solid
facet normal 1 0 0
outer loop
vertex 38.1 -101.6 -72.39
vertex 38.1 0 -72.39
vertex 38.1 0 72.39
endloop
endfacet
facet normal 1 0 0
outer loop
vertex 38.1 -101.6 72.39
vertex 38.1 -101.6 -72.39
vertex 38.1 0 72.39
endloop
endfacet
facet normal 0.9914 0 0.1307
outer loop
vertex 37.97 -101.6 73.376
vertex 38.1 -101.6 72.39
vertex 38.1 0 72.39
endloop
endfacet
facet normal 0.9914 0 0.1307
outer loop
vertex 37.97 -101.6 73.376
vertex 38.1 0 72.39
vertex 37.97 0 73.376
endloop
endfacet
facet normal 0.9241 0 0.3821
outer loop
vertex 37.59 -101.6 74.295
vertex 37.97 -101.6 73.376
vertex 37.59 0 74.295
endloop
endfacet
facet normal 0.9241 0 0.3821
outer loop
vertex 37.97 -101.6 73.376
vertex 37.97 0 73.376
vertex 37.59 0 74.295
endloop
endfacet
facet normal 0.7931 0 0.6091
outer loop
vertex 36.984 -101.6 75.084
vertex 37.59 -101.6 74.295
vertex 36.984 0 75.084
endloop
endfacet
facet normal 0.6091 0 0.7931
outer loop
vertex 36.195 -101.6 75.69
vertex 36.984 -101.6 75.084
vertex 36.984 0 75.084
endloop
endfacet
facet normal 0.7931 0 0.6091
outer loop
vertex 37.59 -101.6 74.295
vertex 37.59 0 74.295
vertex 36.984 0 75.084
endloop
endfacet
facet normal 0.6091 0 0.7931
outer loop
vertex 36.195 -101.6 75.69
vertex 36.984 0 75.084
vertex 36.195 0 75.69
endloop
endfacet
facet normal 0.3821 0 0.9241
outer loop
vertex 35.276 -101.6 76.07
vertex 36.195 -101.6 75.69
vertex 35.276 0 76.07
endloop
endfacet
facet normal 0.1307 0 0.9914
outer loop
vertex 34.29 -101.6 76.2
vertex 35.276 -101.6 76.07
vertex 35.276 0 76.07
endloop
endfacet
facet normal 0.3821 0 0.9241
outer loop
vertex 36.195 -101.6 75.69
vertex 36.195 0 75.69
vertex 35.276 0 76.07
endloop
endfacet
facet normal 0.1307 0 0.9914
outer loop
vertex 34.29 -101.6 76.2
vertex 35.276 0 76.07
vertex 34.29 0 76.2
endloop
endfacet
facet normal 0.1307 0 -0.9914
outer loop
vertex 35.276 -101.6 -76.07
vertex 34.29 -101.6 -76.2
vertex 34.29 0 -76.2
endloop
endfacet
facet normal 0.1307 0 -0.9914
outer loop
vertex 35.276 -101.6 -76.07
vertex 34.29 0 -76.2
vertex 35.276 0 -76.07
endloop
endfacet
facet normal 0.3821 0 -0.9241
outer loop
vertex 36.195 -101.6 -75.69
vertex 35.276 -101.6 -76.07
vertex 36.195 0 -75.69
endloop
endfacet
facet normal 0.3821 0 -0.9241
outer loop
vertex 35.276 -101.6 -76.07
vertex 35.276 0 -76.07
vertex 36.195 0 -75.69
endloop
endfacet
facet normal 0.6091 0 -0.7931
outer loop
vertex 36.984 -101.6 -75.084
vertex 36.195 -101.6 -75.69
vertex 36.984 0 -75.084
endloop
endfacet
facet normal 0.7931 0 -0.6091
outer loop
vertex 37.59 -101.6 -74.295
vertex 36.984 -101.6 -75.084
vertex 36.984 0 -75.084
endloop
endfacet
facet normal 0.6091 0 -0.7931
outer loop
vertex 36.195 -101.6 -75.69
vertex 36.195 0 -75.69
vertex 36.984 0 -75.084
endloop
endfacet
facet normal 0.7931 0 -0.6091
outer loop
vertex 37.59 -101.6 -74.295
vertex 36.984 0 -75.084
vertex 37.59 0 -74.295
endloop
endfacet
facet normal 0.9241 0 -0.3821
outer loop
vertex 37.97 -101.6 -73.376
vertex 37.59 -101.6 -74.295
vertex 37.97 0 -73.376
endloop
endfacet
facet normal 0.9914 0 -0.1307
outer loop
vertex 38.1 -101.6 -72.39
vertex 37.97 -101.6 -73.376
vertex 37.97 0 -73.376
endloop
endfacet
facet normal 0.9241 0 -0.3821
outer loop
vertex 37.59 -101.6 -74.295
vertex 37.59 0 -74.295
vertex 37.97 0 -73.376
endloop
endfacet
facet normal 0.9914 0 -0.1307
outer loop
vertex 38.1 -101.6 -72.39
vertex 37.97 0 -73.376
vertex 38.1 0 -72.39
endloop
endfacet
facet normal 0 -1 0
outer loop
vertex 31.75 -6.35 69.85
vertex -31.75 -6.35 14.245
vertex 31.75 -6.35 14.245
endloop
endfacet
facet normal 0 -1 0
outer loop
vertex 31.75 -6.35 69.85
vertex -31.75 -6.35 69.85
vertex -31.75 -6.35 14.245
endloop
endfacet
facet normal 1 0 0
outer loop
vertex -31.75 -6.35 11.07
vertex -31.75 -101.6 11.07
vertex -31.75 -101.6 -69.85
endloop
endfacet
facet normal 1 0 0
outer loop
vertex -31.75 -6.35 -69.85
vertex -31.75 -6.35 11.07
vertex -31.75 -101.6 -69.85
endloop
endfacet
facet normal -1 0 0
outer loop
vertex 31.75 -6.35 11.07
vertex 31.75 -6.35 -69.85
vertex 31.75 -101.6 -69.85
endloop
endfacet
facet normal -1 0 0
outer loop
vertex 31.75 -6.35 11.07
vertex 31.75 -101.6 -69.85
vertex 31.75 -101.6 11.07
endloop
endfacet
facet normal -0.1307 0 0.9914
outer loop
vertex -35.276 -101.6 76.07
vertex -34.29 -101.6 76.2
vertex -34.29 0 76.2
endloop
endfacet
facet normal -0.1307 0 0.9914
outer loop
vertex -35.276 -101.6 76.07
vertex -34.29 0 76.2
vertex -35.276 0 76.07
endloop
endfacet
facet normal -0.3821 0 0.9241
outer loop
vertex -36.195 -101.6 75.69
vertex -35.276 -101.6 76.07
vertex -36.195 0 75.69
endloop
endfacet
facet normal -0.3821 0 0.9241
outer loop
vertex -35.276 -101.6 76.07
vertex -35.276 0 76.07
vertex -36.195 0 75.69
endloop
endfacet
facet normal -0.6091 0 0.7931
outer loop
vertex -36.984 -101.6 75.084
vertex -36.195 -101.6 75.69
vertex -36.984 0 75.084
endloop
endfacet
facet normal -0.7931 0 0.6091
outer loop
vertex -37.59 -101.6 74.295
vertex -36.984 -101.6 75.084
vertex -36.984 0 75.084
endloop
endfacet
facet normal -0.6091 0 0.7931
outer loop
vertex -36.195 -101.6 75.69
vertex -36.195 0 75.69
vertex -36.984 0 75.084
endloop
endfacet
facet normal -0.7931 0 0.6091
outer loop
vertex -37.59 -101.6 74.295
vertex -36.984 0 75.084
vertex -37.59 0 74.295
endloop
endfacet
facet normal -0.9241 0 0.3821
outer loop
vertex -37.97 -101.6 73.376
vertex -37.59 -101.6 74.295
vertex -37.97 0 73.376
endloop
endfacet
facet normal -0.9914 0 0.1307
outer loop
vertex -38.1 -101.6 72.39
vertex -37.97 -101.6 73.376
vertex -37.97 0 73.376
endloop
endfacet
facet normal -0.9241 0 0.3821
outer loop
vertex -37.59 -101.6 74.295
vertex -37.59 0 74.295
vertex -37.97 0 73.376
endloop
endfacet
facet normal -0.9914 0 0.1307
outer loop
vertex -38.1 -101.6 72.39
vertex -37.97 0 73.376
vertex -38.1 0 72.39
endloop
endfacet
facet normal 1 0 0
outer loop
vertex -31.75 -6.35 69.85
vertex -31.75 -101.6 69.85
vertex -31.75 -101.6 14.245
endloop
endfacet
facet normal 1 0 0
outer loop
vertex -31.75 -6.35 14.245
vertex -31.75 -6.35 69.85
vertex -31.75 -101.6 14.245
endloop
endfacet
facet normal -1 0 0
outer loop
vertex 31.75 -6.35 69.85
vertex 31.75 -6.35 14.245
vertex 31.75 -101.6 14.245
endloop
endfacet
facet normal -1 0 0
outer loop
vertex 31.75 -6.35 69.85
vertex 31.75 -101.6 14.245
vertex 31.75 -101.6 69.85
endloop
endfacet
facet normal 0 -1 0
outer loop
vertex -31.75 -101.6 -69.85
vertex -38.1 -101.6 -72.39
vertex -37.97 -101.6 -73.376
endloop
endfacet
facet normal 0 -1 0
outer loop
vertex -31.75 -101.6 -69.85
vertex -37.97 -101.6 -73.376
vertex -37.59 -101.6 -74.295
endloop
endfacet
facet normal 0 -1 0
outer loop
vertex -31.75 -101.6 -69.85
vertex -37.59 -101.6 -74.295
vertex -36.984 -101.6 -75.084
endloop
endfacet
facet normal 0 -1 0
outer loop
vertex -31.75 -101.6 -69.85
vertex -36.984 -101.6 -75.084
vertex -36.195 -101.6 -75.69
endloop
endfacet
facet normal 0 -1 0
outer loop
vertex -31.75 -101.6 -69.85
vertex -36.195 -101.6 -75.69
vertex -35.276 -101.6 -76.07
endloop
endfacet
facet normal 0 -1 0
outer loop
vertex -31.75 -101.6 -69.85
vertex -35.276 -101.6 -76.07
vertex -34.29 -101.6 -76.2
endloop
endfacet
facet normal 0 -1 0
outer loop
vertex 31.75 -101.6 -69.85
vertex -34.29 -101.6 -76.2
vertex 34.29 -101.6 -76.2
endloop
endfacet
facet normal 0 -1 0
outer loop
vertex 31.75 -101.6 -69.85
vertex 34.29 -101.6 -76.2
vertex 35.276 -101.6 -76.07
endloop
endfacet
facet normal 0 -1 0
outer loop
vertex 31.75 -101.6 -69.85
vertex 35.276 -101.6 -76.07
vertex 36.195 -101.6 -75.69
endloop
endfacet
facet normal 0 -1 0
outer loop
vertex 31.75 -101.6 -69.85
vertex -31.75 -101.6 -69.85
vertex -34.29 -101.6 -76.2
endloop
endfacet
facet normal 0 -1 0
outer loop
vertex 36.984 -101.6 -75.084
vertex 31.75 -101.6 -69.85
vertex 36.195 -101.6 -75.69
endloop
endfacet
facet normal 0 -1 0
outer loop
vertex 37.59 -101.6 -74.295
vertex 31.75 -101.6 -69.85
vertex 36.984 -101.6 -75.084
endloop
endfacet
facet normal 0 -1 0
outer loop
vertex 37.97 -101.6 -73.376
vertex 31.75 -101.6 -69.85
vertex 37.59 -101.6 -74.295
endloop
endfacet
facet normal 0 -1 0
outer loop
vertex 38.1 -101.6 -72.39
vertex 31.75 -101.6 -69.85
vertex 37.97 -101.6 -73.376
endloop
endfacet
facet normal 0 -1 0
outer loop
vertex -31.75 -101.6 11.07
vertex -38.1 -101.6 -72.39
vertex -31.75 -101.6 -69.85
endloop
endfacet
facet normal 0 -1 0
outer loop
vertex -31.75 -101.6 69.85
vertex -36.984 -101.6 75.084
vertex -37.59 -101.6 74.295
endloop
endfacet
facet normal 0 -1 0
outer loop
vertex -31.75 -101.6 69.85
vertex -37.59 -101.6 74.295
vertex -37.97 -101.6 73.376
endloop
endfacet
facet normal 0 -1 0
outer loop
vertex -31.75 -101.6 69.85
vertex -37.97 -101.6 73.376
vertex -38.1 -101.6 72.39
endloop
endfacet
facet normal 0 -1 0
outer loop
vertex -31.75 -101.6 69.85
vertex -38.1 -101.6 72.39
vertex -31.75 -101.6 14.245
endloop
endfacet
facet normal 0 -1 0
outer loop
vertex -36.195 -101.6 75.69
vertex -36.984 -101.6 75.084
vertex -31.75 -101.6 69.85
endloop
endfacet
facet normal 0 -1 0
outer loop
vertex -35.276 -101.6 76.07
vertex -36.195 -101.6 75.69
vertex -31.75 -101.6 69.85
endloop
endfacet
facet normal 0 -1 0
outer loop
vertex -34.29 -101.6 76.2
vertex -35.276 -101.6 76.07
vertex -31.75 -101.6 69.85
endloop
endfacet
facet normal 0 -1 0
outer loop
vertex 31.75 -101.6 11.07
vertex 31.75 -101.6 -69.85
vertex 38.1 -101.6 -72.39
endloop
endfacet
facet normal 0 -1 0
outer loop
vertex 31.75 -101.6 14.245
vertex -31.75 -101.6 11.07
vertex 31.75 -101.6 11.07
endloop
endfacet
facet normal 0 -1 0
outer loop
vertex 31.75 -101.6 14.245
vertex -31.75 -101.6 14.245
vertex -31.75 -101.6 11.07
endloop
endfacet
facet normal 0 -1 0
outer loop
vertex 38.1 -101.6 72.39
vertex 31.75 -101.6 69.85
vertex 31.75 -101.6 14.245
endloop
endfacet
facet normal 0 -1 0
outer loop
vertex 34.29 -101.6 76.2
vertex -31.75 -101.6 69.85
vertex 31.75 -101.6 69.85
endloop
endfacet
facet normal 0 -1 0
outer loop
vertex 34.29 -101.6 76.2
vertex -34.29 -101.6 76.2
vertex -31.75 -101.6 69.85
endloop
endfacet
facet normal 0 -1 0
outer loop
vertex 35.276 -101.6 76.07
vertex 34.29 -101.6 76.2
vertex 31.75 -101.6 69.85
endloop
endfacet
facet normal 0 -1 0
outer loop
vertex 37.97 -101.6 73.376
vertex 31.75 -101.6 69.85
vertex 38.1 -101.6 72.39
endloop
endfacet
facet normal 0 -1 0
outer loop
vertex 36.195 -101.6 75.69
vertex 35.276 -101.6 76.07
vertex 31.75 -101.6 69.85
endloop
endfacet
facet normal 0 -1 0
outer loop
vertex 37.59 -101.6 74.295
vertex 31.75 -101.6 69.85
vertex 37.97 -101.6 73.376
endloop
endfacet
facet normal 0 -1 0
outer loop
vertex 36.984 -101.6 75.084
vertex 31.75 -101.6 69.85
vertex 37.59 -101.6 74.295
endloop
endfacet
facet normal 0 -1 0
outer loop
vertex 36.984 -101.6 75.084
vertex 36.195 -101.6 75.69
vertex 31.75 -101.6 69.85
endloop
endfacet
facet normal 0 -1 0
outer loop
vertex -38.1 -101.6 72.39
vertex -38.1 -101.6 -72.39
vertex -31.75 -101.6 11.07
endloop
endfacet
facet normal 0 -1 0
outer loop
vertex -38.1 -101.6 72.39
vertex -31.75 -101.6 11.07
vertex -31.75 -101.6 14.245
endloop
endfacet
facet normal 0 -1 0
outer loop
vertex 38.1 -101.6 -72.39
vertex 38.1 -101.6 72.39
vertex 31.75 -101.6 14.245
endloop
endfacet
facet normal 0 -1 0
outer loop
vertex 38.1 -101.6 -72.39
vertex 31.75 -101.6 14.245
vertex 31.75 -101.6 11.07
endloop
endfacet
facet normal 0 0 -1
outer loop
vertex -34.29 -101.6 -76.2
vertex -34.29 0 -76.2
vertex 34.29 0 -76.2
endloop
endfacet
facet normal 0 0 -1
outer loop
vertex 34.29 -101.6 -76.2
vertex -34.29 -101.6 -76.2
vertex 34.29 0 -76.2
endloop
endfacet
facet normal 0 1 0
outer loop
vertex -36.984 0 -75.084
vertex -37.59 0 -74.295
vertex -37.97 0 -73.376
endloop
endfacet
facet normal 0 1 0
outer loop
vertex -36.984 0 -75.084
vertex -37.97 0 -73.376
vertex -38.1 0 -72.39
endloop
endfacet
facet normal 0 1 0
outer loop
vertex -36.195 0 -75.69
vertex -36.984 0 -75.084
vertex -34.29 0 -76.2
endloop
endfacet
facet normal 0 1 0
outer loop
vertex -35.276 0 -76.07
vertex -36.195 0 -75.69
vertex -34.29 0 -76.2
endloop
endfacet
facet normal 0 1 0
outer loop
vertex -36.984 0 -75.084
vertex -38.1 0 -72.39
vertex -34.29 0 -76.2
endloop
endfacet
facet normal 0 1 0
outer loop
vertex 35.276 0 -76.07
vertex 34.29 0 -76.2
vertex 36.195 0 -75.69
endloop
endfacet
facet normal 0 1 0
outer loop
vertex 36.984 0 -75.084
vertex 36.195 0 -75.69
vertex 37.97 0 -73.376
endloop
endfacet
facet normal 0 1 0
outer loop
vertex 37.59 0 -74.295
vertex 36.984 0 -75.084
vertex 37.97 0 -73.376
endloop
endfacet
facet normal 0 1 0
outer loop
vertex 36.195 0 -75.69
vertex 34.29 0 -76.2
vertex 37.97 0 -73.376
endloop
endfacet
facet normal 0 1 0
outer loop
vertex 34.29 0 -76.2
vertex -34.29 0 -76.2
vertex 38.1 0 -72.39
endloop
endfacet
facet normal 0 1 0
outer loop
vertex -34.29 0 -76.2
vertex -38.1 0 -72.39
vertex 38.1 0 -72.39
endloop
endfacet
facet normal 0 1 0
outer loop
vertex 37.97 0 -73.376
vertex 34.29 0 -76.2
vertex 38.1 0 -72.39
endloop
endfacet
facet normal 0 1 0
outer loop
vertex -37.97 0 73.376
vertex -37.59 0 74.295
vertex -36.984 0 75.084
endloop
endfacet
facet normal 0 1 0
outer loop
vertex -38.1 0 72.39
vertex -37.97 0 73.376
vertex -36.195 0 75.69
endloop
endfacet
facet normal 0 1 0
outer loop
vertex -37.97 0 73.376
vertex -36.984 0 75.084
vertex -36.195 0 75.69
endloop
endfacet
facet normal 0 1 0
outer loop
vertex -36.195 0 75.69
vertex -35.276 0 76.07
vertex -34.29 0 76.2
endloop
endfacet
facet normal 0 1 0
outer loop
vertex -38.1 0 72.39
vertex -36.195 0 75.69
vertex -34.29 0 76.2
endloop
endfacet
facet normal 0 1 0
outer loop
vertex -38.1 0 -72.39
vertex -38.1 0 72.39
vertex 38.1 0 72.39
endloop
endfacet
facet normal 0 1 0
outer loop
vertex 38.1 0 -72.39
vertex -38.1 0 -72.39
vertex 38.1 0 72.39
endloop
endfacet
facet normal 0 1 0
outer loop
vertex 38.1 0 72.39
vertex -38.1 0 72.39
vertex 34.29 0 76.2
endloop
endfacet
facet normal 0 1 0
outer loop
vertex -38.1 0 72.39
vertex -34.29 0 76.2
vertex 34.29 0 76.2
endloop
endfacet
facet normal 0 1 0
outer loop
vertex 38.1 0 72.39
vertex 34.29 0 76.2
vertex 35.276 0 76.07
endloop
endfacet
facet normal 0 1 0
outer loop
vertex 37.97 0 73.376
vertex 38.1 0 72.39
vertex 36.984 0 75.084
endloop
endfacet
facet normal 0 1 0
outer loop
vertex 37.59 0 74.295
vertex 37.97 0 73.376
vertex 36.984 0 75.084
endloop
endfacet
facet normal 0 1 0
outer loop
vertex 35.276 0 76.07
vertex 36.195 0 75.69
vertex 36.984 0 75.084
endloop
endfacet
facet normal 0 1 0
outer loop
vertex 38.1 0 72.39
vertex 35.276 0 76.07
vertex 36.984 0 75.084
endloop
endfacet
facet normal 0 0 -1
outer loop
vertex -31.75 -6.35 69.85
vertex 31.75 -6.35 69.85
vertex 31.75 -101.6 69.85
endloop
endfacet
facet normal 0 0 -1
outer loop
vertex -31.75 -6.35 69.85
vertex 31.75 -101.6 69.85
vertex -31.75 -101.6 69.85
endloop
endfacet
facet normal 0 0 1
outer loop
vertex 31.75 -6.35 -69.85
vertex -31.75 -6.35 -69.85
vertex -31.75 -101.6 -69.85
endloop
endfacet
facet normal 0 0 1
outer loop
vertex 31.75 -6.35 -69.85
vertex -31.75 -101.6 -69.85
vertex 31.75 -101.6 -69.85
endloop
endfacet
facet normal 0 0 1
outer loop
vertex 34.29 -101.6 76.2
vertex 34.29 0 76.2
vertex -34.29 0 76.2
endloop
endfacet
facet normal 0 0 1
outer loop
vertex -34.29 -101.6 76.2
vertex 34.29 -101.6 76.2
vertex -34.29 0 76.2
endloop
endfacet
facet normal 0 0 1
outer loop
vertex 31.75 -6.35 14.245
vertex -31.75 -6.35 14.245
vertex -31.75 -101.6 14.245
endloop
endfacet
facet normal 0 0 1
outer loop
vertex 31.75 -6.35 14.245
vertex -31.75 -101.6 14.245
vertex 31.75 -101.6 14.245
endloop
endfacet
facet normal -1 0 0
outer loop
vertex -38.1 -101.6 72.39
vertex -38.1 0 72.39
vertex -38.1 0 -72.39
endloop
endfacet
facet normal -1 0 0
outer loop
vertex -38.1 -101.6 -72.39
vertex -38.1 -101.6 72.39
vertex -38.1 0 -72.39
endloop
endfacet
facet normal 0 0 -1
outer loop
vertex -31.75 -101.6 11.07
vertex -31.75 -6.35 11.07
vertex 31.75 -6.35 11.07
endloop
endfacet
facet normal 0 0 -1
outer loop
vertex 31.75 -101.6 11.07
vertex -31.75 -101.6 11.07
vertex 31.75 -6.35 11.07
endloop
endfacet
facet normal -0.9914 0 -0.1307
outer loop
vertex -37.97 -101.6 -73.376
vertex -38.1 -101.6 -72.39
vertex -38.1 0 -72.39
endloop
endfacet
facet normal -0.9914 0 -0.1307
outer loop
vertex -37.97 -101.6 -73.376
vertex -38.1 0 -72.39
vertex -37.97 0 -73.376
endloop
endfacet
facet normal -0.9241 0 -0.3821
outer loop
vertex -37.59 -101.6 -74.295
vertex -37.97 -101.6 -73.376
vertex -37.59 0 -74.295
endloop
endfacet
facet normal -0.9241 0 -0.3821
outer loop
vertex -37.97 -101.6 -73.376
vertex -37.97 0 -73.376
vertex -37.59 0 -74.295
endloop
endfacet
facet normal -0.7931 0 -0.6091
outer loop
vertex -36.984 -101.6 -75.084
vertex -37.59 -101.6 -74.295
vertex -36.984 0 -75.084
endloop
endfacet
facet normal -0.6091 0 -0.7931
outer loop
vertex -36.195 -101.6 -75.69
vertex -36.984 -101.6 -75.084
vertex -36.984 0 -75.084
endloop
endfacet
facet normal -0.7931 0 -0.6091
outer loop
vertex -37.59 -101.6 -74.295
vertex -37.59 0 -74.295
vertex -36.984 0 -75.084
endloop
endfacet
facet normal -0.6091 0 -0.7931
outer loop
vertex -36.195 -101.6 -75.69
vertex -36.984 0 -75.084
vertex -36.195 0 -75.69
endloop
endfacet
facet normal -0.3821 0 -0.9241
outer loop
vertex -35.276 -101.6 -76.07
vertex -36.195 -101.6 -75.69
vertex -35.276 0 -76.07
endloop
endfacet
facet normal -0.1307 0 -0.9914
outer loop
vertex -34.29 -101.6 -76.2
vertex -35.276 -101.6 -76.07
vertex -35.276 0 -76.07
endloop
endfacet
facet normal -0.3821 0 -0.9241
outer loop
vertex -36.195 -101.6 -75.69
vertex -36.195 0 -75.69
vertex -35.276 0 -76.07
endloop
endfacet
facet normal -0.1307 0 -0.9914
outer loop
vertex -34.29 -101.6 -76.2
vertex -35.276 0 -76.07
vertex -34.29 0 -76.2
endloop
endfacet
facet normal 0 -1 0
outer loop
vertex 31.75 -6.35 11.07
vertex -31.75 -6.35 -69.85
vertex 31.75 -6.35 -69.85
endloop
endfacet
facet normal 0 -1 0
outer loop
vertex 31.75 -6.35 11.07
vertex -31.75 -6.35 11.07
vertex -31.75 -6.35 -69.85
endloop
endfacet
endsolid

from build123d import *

# Parameters (mm, degrees)
F1_DEPTH = 101.6
F2_T     = -6.35
F3_W     = 63.5
F3_H     = 3.175
F4_DEPTH = 95.25


with BuildPart() as f1:
    # F0 (on Front) → F1 (new body)
    with BuildSketch(Plane.XZ):
        with BuildLine():
            Line((34.29, 76.2), (-34.29, 76.2))
            ThreePointArc((-34.29, 76.2), (-36.984077, 75.084077), (-38.1, 72.39))
            Line((-38.1, 72.39), (-38.1, -72.39))
            ThreePointArc((-38.1, -72.39), (-36.984077, -75.084077), (-34.29, -76.2))
            Line((-34.29, -76.2), (34.29, -76.2))
            ThreePointArc((34.29, -76.2), (36.984077, -75.084077), (38.1, -72.39))
            Line((38.1, -72.39), (38.1, 72.39))
            ThreePointArc((38.1, 72.39), (36.984077, 75.084077), (34.29, 76.2))
        make_face()
    extrude(amount=F1_DEPTH)

    # F2
    f2_openings = [f1.faces().sort_by_distance(p)[0] for p in [
        (0, -101.6, 0),
    ]]
    offset(amount=F2_T, openings=f2_openings)

    # F3 (on face) → F4 (join)
    with BuildSketch(Plane.XZ.offset(6.35)):
        with Locations((0, 12.657333)):
            Rectangle(F3_W, F3_H)
    extrude(amount=F4_DEPTH)


solid = f1.part
